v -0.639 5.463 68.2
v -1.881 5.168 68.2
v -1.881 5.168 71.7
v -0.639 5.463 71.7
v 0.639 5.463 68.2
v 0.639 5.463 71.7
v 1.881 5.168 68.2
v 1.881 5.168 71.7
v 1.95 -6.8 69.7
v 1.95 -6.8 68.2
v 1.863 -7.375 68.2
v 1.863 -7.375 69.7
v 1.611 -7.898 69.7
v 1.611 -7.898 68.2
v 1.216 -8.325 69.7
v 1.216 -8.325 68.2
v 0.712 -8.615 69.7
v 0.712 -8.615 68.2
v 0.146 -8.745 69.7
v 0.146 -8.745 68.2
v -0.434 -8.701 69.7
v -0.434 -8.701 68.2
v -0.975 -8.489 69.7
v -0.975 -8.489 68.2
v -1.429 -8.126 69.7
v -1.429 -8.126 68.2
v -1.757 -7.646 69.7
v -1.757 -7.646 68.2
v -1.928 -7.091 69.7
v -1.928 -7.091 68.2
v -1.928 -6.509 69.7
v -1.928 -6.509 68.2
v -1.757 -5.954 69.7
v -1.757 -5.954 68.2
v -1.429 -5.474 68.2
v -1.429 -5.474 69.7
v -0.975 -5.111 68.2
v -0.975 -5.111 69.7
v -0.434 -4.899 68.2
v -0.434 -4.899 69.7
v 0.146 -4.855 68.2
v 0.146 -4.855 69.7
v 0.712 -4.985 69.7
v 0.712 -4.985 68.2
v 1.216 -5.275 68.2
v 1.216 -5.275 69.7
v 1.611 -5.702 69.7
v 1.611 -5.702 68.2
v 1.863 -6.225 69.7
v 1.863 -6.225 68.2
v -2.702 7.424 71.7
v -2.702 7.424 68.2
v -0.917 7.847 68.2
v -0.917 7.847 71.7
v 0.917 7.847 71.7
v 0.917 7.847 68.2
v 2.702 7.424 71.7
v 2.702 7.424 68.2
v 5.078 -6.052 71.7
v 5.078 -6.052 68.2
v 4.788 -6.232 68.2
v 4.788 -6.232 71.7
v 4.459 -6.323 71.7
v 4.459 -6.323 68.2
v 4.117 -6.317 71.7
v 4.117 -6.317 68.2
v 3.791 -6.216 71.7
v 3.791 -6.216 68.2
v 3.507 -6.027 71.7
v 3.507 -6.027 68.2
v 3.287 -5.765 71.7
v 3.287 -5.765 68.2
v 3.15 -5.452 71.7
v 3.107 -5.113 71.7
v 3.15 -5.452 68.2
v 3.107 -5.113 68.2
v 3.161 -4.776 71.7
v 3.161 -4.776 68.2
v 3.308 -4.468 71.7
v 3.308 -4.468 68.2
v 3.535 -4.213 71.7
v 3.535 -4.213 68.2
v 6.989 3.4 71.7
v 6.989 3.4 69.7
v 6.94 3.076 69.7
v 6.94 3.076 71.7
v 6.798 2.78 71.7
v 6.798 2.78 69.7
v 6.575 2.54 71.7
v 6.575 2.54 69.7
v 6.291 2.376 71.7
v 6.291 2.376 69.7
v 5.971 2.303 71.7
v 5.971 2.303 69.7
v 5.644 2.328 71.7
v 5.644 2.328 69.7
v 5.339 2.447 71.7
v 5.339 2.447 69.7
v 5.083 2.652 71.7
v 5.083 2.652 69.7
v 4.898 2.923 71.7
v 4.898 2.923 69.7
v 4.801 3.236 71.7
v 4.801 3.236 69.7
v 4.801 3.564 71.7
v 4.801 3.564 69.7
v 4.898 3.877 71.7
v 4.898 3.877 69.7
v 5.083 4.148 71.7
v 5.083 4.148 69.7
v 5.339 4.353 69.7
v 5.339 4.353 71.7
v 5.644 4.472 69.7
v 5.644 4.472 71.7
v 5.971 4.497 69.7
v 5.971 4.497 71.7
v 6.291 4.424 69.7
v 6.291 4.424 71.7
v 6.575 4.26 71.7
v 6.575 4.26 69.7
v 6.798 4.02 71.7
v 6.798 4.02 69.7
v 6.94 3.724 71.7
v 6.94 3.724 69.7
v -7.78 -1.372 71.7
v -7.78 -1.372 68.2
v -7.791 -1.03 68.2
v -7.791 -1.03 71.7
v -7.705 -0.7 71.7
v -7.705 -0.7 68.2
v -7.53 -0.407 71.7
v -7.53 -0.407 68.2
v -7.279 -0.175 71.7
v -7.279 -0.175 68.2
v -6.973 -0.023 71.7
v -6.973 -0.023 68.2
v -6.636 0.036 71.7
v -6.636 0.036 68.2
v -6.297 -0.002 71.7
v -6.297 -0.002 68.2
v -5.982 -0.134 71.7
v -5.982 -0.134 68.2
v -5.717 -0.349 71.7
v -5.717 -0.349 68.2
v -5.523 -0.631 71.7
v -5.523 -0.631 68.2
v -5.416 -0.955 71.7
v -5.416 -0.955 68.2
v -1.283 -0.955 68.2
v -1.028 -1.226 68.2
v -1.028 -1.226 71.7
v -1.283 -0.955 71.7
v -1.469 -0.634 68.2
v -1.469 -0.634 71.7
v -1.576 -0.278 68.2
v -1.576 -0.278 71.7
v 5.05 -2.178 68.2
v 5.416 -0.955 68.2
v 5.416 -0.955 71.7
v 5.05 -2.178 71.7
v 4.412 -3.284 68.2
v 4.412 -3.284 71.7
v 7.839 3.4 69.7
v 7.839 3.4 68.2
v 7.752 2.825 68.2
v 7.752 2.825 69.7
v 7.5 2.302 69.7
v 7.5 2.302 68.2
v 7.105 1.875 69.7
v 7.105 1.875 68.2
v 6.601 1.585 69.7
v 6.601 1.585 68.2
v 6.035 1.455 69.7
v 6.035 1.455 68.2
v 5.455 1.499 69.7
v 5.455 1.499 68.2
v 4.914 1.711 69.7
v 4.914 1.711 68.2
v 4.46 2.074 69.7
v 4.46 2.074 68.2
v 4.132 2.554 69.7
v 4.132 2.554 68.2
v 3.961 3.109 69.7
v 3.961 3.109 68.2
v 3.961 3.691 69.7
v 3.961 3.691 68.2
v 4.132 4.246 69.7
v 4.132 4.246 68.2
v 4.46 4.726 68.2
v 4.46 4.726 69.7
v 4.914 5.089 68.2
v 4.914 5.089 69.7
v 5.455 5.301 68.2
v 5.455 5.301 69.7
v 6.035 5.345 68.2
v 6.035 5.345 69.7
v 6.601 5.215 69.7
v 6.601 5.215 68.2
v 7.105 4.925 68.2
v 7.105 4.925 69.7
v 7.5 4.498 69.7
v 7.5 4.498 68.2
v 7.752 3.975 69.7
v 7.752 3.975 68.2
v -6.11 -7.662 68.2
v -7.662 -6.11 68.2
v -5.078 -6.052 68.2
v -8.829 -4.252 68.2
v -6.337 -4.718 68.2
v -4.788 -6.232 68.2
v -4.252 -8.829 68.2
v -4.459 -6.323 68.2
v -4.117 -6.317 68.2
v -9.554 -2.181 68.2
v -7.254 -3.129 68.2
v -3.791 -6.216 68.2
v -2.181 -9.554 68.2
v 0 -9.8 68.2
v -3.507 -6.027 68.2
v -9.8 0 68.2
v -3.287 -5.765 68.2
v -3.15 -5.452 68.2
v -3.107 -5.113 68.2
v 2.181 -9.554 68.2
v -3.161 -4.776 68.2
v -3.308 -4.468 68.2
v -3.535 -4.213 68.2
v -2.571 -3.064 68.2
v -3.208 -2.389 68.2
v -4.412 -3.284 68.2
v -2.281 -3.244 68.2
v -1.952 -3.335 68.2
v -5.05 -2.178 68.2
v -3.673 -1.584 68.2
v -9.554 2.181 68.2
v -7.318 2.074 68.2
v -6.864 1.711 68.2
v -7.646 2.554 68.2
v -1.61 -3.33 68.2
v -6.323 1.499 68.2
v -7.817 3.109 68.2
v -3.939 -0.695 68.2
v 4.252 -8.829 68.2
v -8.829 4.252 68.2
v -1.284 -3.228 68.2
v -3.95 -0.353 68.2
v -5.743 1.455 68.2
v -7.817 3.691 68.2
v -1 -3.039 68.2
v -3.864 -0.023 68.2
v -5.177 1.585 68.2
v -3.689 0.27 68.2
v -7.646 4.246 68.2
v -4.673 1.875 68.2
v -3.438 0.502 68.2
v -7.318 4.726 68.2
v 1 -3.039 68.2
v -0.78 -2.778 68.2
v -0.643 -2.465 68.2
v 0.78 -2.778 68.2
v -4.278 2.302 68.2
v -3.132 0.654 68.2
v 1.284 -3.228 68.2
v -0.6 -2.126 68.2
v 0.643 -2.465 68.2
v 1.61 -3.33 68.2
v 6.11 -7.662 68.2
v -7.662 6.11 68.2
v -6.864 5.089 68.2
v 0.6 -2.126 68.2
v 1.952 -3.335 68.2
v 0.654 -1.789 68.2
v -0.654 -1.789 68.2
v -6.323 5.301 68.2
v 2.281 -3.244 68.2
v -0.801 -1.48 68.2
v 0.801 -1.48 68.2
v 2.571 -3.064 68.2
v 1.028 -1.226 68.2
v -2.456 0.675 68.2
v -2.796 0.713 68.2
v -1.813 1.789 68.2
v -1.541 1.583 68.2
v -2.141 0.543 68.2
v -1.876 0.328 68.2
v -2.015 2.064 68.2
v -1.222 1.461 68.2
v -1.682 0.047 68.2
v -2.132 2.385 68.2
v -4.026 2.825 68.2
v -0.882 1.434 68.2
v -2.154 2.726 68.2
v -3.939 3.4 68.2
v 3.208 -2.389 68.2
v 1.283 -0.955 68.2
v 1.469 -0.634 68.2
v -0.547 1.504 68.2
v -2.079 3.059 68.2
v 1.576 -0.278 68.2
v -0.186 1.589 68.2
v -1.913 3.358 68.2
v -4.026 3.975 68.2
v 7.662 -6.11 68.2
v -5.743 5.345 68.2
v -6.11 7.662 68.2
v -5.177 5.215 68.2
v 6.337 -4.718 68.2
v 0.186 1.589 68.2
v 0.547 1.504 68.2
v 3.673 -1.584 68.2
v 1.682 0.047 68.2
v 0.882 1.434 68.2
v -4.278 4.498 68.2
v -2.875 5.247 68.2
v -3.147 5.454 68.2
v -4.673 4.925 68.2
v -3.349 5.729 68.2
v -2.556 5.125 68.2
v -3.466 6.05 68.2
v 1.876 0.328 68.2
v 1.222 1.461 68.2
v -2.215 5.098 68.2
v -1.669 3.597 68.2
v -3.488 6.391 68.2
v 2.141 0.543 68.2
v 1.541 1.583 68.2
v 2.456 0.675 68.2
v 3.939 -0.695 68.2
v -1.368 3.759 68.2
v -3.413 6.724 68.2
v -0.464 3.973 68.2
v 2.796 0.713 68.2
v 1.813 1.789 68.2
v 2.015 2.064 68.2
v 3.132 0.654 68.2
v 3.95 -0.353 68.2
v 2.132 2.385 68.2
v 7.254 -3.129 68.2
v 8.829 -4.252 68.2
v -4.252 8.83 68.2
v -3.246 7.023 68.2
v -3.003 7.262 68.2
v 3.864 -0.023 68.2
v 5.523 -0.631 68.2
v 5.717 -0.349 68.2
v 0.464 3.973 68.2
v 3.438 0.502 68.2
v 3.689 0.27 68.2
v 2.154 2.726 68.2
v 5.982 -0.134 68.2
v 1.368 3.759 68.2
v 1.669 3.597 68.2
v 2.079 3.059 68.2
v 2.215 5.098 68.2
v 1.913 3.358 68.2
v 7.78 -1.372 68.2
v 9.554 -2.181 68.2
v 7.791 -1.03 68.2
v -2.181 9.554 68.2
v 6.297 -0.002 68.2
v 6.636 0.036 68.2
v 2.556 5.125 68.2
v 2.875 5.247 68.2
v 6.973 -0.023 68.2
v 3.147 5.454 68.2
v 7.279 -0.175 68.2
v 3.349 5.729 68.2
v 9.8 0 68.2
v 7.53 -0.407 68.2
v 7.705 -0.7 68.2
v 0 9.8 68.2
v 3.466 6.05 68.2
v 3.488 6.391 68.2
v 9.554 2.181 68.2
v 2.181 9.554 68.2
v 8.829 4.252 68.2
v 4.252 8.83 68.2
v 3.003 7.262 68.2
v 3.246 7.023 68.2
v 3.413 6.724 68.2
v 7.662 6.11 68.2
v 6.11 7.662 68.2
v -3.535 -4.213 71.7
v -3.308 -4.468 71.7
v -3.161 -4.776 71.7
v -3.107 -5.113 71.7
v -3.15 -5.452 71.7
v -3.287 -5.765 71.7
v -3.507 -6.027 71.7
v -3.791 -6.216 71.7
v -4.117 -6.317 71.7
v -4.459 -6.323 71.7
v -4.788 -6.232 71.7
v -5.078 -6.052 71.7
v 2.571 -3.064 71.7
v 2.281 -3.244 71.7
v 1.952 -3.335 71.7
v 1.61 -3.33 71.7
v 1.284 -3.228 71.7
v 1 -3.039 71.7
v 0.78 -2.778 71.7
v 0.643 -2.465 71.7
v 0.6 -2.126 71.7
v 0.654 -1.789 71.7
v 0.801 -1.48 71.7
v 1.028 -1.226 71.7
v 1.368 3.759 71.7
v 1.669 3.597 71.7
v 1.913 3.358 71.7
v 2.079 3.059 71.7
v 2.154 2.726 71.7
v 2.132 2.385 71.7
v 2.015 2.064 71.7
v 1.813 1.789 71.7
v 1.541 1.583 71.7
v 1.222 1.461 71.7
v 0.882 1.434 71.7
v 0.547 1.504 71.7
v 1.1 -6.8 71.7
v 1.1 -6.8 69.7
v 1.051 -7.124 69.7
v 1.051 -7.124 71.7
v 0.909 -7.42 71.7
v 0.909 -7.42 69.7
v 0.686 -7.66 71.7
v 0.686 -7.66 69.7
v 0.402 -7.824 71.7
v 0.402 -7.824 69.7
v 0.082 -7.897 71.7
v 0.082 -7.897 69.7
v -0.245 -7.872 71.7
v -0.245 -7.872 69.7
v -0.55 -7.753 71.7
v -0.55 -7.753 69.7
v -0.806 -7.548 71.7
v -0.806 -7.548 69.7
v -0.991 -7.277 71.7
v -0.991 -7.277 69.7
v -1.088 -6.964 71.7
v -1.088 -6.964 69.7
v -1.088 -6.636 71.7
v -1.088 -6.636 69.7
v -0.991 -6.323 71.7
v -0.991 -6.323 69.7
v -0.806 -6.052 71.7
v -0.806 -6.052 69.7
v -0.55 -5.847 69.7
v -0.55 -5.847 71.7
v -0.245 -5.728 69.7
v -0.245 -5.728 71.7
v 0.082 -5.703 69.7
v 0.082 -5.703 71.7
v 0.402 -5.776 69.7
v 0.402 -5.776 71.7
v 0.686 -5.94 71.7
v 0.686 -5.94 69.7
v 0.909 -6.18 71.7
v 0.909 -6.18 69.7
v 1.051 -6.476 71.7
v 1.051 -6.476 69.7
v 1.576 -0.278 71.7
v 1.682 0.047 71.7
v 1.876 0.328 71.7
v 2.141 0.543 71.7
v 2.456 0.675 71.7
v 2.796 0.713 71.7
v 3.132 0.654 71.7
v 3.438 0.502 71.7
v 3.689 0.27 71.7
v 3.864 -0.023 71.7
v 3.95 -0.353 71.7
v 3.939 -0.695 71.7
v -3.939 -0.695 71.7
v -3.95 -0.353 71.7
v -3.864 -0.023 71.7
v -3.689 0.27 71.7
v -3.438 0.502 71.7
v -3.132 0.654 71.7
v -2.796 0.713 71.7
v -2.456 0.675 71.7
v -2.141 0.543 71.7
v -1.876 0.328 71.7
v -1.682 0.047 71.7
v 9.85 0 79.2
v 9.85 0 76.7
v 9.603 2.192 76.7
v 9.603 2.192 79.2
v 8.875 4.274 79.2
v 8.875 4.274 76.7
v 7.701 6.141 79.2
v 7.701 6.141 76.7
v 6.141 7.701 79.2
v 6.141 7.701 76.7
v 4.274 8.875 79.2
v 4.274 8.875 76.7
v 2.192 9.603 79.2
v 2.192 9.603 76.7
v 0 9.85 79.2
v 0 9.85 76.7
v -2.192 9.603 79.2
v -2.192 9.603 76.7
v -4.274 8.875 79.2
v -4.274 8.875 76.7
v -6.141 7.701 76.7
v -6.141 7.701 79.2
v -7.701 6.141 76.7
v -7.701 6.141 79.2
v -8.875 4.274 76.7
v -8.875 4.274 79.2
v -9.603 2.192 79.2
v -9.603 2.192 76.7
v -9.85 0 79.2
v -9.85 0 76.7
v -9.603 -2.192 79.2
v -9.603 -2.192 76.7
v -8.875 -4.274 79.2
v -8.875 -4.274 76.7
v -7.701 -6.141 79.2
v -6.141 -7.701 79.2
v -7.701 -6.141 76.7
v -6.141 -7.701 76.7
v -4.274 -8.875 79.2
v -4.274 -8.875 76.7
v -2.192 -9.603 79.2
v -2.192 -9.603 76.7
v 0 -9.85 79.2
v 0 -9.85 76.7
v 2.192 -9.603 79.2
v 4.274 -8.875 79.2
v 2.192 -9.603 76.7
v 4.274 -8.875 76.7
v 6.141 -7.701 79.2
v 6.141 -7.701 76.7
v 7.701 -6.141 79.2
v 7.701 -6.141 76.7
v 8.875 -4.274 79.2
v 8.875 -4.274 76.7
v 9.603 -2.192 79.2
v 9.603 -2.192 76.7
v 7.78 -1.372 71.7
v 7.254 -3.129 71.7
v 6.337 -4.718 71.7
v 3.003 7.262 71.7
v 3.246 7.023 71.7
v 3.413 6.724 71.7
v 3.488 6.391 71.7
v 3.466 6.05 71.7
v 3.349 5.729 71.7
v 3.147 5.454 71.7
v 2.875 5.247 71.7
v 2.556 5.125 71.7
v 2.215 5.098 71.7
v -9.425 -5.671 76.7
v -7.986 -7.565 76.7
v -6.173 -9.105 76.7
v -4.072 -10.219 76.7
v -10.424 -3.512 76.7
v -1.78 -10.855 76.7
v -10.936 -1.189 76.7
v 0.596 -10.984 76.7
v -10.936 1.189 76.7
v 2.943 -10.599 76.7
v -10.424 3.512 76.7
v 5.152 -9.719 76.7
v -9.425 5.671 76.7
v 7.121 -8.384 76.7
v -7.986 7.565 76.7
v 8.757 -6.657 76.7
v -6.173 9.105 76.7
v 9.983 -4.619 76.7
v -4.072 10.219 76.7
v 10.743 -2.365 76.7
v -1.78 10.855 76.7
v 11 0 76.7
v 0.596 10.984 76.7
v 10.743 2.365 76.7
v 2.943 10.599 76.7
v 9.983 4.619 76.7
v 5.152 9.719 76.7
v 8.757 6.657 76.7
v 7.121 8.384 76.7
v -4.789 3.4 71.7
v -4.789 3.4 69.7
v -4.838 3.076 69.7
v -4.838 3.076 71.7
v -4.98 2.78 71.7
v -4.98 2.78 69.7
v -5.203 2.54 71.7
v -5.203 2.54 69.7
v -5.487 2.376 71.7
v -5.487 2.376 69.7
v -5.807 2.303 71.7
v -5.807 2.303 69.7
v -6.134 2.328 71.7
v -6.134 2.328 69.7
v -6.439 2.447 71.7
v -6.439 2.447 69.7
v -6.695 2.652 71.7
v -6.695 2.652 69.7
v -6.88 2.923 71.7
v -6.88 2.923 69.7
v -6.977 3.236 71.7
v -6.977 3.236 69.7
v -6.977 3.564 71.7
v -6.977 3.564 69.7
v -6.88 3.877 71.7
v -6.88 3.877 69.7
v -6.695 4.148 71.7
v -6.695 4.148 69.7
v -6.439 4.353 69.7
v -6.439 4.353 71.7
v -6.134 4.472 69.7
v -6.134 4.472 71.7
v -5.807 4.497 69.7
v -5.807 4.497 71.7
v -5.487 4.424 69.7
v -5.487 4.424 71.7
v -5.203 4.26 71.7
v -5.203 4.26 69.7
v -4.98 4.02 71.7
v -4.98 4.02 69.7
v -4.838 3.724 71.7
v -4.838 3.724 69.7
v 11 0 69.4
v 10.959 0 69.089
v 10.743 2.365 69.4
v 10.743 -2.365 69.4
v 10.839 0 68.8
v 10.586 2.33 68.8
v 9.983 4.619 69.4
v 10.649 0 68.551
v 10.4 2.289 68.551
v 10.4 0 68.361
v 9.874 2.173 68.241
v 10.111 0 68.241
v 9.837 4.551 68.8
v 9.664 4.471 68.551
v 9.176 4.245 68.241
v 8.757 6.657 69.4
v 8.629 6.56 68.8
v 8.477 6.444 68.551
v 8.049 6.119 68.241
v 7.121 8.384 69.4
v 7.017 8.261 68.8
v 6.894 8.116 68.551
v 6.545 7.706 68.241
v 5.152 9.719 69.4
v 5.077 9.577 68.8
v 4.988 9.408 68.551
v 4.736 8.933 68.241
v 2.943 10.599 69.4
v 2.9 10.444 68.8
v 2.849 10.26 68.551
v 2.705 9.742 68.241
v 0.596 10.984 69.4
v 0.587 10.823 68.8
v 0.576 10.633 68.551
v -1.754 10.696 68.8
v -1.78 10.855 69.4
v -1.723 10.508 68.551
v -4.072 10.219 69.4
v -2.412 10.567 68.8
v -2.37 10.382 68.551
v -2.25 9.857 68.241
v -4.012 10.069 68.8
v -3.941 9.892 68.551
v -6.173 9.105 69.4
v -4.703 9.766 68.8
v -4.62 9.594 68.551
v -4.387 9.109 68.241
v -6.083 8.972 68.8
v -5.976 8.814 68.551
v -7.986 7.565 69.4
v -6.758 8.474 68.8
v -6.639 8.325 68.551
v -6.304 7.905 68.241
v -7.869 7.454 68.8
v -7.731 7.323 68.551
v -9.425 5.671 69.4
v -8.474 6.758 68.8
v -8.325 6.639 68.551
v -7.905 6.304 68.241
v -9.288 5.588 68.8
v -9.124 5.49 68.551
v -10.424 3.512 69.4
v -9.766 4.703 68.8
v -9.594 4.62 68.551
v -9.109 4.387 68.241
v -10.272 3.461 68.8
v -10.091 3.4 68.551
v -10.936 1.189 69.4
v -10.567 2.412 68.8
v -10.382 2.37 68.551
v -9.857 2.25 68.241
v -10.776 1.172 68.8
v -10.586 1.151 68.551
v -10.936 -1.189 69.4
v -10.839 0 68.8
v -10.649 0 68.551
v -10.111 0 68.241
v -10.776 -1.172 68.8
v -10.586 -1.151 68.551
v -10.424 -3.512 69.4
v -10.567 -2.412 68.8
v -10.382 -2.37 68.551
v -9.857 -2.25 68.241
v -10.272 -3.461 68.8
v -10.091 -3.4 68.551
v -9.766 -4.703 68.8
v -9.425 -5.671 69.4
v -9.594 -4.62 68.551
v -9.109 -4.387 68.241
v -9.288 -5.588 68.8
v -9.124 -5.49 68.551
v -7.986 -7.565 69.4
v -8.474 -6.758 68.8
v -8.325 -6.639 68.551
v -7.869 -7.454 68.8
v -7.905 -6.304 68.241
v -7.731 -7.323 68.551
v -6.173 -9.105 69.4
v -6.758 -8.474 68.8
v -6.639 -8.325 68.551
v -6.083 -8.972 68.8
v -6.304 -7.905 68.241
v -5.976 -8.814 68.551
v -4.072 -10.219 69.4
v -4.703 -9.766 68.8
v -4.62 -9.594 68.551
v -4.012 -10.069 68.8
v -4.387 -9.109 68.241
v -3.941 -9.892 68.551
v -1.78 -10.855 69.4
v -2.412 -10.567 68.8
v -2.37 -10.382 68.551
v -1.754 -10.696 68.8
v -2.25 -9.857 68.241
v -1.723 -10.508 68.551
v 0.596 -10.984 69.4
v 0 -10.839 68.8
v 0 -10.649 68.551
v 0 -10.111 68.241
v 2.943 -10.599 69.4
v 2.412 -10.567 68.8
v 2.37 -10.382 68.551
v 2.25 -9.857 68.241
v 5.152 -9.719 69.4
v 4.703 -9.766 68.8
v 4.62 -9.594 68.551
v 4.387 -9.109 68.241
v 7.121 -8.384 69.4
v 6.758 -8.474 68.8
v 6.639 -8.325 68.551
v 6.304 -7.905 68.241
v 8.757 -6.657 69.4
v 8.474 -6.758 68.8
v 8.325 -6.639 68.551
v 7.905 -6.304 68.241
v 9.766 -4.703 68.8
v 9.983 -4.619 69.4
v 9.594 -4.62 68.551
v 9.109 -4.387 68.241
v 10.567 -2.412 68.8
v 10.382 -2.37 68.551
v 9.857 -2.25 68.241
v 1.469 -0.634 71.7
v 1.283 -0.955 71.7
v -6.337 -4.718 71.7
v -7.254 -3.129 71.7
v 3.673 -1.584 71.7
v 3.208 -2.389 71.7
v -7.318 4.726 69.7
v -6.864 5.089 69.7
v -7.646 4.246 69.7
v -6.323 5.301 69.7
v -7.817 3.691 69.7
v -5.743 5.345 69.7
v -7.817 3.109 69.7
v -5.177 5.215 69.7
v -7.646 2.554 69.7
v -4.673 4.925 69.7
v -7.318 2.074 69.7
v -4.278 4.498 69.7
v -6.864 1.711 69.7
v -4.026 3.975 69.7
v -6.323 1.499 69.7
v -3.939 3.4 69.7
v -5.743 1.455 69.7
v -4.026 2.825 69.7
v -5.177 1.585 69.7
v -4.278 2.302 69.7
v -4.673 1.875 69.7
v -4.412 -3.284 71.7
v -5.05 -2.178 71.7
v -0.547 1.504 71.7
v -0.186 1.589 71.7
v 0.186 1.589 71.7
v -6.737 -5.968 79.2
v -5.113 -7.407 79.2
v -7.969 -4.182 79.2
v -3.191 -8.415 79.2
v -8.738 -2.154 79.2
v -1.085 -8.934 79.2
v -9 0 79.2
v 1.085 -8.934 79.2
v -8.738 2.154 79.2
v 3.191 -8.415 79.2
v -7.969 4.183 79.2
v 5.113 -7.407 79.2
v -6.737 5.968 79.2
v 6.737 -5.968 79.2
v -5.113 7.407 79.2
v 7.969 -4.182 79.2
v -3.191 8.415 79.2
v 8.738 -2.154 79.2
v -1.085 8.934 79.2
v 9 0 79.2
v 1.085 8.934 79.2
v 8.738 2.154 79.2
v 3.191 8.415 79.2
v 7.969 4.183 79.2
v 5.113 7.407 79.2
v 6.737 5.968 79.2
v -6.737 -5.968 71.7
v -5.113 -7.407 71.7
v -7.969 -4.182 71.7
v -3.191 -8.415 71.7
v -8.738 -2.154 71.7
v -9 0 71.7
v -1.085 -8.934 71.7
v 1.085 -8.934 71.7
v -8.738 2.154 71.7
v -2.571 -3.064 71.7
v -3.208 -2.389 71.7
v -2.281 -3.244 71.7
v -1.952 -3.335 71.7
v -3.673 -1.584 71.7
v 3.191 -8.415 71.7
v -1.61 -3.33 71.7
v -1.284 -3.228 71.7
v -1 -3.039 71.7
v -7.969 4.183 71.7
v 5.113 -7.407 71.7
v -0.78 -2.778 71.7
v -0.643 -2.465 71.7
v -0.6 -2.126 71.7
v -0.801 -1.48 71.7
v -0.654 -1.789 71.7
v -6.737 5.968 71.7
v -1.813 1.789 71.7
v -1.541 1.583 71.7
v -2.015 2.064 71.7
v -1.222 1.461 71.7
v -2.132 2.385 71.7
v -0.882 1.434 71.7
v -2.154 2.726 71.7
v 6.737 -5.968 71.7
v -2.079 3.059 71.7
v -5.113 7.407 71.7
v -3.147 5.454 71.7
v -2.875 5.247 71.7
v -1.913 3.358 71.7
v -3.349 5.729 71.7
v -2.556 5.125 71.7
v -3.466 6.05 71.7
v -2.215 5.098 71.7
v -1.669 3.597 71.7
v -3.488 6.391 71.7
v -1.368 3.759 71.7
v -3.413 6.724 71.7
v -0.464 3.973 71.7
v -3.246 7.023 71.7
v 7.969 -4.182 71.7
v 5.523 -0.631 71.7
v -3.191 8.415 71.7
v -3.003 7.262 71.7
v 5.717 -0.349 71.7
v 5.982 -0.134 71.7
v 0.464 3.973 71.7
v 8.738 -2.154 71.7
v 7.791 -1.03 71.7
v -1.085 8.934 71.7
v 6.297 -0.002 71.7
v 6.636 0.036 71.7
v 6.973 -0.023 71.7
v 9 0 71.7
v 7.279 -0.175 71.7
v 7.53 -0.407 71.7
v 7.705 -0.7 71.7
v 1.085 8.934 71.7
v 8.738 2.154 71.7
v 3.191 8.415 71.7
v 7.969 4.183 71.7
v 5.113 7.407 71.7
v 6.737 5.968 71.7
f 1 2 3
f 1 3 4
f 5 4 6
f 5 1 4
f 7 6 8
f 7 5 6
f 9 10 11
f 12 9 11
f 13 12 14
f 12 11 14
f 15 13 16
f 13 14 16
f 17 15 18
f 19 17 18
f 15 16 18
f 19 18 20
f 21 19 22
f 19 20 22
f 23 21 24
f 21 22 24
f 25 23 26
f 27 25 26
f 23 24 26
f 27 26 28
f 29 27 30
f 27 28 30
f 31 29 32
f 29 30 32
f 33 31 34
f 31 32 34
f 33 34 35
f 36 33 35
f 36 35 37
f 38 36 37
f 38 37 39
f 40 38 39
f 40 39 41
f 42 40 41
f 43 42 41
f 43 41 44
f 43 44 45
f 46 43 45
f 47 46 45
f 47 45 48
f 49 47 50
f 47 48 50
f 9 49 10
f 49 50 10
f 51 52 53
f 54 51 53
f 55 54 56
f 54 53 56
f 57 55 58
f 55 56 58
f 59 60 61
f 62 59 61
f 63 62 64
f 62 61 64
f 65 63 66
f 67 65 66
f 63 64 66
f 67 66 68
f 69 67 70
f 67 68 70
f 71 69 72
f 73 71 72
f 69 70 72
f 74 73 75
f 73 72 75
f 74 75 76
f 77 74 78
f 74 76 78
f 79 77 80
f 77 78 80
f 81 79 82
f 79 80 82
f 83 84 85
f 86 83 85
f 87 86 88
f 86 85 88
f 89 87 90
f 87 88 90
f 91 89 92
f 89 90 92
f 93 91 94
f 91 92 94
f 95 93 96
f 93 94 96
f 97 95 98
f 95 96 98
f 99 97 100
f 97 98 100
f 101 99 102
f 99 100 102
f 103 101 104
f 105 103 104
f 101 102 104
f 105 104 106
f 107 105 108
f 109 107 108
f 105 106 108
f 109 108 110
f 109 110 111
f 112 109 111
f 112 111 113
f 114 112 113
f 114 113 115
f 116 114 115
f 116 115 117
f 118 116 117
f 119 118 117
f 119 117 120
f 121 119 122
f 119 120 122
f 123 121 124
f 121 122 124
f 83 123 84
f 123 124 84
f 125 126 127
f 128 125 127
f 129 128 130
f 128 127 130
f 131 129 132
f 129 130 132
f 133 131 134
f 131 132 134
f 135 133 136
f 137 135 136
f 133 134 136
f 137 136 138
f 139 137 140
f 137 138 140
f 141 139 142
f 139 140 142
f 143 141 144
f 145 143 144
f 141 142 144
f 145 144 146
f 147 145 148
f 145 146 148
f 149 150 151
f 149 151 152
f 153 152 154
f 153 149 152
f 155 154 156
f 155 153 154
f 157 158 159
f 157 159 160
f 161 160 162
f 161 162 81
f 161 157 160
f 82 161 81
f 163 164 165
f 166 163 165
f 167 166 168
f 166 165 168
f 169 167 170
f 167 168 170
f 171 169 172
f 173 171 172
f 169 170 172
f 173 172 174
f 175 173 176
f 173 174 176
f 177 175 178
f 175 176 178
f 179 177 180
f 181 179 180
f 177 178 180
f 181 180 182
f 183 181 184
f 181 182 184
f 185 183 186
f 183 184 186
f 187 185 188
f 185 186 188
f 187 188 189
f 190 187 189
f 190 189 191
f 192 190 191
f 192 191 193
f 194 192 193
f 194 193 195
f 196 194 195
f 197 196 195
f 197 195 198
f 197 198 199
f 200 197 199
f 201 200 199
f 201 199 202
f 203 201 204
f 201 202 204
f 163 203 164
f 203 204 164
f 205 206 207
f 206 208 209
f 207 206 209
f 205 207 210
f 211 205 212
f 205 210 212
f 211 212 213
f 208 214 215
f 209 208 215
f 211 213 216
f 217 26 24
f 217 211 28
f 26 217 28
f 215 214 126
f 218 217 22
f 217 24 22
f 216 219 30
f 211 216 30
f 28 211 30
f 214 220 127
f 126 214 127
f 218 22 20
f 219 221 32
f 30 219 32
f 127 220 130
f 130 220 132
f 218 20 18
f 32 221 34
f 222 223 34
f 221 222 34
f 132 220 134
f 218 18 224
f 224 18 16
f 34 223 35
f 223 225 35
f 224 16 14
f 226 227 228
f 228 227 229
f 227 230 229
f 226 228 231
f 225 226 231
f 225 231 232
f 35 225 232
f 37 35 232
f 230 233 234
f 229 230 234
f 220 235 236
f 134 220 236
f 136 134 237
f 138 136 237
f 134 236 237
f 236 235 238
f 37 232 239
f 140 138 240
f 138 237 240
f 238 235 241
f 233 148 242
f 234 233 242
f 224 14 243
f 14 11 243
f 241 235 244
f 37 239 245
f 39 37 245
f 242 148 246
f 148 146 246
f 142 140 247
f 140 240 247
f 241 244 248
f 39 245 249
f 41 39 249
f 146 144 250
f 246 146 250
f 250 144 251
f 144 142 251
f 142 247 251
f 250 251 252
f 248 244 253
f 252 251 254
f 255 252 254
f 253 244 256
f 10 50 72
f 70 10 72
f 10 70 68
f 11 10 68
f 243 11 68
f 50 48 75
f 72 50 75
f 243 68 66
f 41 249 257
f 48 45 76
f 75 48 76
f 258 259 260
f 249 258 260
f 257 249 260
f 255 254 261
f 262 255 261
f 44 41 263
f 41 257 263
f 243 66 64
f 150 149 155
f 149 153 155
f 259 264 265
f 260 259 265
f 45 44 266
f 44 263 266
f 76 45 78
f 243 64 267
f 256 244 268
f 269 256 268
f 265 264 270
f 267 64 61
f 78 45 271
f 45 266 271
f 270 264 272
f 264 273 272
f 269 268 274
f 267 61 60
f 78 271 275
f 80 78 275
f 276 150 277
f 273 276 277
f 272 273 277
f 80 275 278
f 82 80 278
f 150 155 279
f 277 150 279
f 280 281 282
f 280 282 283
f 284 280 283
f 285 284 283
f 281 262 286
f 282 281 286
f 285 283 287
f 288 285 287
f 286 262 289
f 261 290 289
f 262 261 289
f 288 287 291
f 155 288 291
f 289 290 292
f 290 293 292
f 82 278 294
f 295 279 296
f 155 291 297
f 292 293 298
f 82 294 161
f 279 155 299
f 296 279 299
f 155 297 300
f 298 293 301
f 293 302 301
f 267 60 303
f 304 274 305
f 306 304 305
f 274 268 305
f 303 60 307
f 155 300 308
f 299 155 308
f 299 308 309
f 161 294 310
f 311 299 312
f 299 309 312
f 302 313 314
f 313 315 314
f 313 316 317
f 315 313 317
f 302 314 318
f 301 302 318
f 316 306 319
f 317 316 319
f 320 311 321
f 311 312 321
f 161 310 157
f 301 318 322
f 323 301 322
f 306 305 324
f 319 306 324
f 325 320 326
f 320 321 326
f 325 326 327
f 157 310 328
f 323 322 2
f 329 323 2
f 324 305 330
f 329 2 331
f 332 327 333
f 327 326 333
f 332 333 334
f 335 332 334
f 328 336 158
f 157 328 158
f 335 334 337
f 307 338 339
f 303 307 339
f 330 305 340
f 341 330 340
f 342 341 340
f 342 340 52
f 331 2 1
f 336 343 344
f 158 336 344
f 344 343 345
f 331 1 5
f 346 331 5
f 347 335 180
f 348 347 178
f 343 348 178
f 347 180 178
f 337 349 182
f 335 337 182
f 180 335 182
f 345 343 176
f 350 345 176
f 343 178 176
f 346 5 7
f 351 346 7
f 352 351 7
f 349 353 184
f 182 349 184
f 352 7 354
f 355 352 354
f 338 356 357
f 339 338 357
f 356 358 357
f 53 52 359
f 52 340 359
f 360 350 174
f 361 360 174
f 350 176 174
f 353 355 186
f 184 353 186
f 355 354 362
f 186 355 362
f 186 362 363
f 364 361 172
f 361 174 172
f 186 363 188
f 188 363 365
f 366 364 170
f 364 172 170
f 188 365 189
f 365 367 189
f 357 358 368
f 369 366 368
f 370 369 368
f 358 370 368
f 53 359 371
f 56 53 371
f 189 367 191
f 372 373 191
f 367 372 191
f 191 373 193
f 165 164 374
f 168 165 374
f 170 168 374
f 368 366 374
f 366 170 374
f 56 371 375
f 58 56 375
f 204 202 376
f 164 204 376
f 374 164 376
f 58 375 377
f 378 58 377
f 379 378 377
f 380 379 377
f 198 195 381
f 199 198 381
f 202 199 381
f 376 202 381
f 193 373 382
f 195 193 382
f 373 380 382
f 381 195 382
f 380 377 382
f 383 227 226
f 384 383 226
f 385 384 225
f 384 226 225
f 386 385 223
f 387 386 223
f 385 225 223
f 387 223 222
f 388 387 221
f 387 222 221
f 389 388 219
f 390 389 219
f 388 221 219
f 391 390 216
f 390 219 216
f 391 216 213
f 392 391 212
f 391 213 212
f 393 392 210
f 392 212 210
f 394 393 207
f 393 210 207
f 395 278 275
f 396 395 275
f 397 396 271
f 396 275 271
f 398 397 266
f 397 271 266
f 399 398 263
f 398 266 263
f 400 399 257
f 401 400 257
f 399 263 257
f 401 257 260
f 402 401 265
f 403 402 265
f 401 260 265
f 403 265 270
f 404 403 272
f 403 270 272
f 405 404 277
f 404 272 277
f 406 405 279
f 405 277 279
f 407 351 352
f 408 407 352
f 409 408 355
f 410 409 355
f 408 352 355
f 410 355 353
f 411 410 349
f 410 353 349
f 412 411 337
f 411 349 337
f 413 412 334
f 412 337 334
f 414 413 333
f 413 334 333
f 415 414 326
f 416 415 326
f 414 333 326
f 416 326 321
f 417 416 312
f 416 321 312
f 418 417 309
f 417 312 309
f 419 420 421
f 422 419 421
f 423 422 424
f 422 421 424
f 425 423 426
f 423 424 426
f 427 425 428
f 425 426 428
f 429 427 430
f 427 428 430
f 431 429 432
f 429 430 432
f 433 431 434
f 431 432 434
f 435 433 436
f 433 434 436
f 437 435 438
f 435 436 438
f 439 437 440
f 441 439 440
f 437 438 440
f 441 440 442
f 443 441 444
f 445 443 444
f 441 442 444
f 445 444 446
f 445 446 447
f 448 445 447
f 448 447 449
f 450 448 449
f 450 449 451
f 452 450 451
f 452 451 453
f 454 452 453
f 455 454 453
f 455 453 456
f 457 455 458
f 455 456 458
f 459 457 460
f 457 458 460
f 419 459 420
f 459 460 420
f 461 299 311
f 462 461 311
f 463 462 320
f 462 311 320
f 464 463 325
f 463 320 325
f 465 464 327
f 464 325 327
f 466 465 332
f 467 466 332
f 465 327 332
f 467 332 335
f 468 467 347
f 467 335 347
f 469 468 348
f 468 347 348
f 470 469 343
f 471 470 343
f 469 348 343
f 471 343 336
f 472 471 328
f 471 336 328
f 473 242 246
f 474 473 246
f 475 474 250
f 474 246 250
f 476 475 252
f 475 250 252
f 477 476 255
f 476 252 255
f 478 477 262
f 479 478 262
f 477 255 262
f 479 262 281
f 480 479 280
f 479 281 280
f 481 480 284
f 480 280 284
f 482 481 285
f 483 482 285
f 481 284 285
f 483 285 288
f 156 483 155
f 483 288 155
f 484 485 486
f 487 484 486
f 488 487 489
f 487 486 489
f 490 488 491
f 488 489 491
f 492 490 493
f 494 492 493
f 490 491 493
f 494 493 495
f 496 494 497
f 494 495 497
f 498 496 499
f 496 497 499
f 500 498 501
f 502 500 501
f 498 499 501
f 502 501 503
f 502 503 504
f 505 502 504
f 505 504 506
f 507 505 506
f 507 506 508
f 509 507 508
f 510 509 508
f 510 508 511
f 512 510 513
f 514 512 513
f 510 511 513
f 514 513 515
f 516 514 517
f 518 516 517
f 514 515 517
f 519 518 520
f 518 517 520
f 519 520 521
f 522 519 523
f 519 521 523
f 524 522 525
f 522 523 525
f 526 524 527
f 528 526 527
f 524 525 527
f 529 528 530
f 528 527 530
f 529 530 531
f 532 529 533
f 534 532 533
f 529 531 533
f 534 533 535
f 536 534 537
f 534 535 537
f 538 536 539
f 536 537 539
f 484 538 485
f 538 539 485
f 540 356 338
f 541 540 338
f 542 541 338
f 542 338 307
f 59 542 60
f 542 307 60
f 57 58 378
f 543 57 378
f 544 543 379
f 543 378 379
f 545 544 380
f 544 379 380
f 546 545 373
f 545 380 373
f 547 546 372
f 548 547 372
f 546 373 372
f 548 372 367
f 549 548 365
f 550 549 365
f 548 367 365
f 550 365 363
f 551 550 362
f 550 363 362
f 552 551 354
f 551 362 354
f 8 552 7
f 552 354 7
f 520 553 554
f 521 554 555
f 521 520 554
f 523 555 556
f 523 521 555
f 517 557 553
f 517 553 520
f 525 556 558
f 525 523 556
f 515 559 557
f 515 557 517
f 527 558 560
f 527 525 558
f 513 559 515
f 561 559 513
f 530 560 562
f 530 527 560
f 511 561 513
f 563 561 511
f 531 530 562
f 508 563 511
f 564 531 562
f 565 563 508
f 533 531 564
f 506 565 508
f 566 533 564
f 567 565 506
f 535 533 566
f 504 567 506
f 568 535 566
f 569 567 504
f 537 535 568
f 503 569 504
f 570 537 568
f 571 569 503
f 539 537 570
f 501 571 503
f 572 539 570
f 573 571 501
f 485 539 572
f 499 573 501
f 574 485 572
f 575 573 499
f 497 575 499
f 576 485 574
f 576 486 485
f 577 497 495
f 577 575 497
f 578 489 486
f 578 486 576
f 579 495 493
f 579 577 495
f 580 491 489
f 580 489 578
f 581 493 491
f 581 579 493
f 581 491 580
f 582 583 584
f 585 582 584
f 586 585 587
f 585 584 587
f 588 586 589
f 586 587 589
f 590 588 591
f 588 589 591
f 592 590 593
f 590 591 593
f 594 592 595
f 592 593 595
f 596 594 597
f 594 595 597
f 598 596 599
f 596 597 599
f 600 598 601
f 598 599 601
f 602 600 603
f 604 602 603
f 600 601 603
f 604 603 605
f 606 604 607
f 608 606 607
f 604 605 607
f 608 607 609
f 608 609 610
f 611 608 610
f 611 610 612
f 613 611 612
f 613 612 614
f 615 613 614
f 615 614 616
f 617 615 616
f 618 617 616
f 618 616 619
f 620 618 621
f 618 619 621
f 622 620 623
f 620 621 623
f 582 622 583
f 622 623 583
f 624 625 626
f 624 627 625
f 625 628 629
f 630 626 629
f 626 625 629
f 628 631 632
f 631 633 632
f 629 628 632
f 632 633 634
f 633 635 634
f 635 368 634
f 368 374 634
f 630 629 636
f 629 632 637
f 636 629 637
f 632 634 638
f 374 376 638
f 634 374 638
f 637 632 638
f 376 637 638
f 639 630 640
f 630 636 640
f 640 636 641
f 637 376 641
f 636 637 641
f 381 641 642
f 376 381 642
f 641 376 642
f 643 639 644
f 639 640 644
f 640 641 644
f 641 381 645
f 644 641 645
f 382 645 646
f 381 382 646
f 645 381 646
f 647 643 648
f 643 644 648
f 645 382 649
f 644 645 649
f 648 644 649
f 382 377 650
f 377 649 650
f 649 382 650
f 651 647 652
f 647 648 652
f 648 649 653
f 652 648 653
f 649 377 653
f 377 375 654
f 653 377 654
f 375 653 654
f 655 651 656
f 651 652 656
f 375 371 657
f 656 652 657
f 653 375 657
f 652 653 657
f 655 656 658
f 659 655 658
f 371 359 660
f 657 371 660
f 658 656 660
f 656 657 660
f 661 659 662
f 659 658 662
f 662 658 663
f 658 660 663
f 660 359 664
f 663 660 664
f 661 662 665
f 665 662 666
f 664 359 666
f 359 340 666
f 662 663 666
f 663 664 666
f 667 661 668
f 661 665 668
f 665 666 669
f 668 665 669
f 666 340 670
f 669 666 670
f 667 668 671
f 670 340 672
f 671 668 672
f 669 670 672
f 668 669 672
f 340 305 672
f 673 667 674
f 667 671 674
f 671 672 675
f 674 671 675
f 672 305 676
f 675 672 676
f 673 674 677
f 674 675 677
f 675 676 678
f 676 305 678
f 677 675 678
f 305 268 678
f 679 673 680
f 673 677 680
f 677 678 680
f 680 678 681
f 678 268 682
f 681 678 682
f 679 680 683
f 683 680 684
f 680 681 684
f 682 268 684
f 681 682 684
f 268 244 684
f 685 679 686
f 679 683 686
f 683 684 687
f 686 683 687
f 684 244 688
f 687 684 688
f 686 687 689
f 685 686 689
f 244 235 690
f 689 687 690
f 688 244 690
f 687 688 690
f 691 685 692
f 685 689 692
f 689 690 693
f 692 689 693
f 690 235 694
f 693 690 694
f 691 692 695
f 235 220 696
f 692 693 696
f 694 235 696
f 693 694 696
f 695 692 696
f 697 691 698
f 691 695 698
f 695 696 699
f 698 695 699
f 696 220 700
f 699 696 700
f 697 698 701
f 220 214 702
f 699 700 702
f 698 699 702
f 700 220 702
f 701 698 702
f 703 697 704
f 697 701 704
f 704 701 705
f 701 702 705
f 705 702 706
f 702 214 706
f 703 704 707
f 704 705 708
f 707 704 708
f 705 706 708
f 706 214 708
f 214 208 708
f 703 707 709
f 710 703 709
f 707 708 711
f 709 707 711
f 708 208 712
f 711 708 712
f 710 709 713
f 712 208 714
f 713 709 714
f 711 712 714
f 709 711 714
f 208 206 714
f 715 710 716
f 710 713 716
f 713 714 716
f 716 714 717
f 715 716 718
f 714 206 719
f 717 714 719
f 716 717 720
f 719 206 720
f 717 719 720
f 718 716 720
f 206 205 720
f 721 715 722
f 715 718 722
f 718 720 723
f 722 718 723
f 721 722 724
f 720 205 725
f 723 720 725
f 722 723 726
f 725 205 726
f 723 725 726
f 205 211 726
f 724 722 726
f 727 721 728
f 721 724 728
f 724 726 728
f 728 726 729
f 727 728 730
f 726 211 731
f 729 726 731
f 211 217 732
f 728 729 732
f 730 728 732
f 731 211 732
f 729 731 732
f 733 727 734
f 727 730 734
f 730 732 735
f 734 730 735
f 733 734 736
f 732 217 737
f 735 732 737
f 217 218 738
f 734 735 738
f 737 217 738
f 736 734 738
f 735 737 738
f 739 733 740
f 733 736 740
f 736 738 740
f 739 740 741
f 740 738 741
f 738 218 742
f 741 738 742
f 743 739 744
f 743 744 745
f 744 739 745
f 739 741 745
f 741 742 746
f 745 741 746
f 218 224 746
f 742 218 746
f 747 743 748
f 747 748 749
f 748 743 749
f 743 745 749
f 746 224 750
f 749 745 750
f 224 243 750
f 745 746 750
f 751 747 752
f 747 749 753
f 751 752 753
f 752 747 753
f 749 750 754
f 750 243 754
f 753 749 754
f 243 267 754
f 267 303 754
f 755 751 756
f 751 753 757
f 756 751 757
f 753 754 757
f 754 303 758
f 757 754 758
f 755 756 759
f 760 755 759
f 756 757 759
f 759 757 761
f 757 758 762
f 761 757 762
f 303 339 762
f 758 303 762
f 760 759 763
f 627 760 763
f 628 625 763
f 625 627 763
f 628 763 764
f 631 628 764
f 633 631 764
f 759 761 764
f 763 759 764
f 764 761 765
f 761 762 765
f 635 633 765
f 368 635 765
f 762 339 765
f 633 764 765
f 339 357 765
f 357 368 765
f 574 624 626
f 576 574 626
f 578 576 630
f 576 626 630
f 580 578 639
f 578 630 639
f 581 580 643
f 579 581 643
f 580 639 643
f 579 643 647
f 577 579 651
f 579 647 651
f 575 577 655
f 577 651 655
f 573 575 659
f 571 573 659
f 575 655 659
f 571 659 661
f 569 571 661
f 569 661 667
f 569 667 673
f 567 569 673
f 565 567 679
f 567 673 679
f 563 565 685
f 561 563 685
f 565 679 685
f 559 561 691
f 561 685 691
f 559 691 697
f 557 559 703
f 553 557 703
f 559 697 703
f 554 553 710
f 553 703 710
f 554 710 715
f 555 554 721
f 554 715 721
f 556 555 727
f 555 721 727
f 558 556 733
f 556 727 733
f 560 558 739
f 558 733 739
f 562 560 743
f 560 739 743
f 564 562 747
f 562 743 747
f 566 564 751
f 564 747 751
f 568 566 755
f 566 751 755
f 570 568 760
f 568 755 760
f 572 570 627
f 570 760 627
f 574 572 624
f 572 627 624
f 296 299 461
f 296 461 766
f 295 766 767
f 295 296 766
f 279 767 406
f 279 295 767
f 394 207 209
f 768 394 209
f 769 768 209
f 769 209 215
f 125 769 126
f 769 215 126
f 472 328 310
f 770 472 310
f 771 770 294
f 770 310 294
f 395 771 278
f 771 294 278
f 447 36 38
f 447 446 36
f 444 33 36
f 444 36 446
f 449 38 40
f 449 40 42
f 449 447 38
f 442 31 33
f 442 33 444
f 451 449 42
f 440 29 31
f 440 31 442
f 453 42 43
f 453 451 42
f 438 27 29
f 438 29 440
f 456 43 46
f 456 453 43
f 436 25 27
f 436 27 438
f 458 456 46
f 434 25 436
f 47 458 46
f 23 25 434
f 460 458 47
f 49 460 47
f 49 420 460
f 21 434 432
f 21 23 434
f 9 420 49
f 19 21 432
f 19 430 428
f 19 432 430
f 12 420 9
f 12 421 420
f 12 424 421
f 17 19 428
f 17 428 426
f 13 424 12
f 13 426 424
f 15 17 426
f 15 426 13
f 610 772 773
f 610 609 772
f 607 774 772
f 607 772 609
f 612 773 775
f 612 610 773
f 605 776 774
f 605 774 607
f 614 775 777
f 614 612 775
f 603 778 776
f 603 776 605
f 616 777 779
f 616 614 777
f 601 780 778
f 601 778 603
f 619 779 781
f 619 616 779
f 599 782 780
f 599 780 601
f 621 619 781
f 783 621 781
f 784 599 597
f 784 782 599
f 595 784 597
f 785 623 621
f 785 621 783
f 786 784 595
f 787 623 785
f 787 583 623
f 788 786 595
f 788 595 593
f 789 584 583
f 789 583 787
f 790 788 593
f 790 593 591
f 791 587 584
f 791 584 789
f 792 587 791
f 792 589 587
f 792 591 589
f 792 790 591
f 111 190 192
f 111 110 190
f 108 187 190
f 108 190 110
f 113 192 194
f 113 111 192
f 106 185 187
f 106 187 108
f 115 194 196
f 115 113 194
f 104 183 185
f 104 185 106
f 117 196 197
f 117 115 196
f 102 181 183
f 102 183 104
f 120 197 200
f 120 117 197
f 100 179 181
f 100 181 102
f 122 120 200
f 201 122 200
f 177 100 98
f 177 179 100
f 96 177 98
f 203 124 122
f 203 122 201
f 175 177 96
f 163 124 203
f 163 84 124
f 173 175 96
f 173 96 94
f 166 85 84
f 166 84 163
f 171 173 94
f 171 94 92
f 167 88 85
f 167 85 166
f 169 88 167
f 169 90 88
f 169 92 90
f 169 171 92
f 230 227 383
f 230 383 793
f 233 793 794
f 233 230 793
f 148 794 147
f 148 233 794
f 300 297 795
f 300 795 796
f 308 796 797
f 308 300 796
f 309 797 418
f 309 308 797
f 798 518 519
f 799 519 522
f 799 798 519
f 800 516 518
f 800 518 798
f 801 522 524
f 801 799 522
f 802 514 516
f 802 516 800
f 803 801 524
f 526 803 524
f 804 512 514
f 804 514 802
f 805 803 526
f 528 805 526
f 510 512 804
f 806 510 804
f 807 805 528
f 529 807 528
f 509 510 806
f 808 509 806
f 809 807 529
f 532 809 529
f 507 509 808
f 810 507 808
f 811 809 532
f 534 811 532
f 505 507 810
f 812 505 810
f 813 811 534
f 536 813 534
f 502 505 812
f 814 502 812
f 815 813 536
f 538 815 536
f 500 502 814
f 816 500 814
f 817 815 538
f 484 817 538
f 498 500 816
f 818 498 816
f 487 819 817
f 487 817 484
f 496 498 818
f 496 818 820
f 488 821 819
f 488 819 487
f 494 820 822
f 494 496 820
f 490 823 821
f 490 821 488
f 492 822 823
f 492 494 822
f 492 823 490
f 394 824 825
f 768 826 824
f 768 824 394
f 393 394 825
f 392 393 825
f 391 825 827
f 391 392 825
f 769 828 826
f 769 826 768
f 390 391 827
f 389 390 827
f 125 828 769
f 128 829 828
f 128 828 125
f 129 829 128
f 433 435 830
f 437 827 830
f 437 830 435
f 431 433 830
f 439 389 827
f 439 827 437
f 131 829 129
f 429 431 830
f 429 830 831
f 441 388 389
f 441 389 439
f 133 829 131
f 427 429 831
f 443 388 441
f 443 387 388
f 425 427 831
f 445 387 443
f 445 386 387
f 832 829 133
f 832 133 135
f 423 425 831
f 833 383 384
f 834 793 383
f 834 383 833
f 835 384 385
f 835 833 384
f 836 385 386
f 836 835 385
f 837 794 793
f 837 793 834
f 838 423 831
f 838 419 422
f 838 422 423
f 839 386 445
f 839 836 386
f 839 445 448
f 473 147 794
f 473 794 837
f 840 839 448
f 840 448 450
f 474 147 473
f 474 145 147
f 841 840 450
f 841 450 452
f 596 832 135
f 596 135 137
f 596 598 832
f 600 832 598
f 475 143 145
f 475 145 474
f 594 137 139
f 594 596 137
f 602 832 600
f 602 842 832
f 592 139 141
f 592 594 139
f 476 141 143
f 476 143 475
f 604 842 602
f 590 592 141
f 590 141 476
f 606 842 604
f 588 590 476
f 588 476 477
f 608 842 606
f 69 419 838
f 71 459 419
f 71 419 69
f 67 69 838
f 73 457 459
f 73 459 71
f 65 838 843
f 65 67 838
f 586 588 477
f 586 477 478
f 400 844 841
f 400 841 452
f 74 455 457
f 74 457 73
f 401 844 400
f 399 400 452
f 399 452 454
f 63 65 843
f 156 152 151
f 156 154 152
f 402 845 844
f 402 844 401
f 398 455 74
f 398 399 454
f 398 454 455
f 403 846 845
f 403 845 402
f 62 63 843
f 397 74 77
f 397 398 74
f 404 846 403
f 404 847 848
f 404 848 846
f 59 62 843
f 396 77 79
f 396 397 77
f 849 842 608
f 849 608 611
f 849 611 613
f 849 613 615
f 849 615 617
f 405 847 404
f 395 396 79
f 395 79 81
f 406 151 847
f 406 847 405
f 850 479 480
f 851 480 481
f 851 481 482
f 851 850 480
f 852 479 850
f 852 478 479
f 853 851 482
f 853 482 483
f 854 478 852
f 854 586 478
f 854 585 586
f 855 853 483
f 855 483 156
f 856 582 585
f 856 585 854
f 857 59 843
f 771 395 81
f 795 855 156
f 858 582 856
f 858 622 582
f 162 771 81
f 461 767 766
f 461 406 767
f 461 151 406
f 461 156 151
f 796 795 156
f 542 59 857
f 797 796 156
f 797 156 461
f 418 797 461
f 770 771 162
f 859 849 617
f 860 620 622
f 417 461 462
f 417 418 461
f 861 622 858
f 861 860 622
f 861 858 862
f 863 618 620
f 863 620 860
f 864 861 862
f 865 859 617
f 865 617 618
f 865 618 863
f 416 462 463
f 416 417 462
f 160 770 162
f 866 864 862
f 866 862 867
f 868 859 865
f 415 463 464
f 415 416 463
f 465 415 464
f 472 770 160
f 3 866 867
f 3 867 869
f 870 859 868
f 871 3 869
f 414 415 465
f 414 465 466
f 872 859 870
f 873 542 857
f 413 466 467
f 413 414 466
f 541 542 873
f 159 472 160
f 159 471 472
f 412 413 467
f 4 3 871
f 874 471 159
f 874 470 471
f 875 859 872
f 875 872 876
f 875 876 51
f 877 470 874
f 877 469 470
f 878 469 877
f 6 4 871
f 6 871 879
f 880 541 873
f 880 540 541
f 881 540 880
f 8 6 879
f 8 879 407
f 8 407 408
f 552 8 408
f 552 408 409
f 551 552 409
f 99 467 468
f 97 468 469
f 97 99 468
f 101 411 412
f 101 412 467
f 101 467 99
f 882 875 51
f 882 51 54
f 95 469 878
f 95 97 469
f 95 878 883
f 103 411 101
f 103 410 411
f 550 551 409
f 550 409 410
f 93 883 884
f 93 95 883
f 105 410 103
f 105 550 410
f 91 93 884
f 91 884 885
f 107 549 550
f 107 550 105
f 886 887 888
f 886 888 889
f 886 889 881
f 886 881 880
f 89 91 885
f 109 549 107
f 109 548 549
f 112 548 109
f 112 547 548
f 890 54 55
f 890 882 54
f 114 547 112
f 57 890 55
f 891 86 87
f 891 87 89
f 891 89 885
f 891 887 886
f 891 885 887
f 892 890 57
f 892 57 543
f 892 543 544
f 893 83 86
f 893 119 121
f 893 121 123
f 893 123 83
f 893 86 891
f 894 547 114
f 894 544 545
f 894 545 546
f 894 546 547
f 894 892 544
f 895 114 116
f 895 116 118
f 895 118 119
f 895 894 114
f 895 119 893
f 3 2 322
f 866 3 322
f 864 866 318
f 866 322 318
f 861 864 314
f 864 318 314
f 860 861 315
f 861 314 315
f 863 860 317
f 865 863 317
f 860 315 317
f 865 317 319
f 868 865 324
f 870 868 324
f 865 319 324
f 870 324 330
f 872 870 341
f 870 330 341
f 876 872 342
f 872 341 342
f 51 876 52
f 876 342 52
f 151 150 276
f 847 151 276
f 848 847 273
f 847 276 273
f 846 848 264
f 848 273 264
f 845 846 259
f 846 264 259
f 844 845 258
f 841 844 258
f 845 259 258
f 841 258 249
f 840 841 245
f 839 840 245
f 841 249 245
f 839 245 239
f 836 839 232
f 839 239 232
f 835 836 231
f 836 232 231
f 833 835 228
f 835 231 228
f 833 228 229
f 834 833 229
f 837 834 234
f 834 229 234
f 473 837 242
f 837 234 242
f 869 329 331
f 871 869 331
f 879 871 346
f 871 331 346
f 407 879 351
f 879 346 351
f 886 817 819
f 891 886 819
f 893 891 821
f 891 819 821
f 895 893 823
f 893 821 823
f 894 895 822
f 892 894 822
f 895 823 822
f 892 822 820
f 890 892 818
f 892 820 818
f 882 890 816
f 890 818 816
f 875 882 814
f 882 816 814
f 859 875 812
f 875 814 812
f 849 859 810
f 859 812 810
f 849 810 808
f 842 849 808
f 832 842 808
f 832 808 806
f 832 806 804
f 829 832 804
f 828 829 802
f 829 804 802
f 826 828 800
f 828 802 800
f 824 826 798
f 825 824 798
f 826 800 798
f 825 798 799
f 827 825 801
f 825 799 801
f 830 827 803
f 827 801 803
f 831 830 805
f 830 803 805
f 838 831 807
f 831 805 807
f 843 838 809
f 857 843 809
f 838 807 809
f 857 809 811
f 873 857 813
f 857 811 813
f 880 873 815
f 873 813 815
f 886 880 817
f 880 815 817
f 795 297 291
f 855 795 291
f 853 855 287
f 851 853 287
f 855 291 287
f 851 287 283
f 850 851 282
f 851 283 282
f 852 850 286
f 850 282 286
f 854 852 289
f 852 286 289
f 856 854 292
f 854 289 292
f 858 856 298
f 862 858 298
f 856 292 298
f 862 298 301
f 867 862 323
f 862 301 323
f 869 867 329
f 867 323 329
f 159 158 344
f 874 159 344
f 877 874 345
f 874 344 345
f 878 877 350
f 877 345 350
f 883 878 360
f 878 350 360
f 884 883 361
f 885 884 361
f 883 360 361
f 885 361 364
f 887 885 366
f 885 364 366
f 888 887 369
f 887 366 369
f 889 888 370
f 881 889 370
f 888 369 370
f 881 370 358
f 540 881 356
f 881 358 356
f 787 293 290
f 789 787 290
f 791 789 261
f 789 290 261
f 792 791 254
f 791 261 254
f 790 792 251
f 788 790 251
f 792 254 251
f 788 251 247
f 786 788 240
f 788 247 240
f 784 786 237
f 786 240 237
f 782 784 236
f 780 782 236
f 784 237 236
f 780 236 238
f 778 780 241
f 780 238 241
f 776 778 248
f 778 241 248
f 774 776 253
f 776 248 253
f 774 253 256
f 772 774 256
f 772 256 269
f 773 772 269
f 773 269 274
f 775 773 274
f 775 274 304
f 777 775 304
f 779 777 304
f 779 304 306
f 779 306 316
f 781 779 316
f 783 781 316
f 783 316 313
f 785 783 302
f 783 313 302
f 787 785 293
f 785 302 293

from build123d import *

# Parameters (mm, degrees)
SKETCH_R        = 11
PAD_DEPTH       = 8.5
SKETCH001_R     = 9.85
PAD001_DEPTH    = 2.5
SKETCH002_R     = 9
POCKET_DEPTH    = 7.5
SKETCH003_R     = 1.95
POCKET001_DEPTH = 1.5
FILLET_R        = 1.2
SKETCH005_R     = 1.1
POCKET002_DEPTH = 2
POCKET003_DEPTH = 3.5


with BuildPart() as part:
    # Sketch → Pad (new body)
    with BuildSketch(Plane.XY):
        Circle(SKETCH_R)
    extrude(amount=PAD_DEPTH)

    # Sketch001 (on Face3 of Pad) → Pad001 (join)
    with BuildSketch(Plane.XY.offset(8.5)):
        Circle(SKETCH001_R)
    extrude(amount=PAD001_DEPTH)

    # Sketch002 (on Face5 of Pad001) → Pocket (cut)
    with BuildSketch(Plane.XY.offset(11)):
        Circle(SKETCH002_R)
    extrude(amount=-POCKET_DEPTH, mode=Mode.SUBTRACT)

    # Sketch003 (on Face2 of Pocket) → Pocket001 (cut)
    with BuildSketch(Plane(origin=(0, 0, 0), x_dir=(1, 0, 0), z_dir=(0, 0, -1))):
        with Locations((0, 6.8)):
            Circle(SKETCH003_R)
        with Locations((-5.8889727457, -3.4)):
            Circle(SKETCH003_R)
        with Locations((5.8889727457, -3.4)):
            Circle(SKETCH003_R)
    extrude(amount=-POCKET001_DEPTH, mode=Mode.SUBTRACT)

    # Fillet
    fillet_edges = [part.edges().sort_by_distance(p)[0] for p in [
        (-11, 0, 0),
    ]]
    fillet(fillet_edges, radius=FILLET_R)

    # Sketch005 (on Face11 of Fillet) → Pocket002 (cut)
    with BuildSketch(Plane(origin=(0, 0, 1.5), x_dir=(1, 0, 0), z_dir=(0, 0, -1))):
        with Locations((-5.8889727457, -3.4)):
            Circle(SKETCH005_R)
        with Locations((0, 6.8)):
            Circle(SKETCH005_R)
        with Locations((5.8889727457, -3.4)):
            Circle(SKETCH005_R)
    extrude(amount=-POCKET002_DEPTH, mode=Mode.SUBTRACT)

    # Sketch007 (on Face4 of Pocket002) → Pocket003 (cut)
    with BuildSketch(Plane(origin=(0, 0, 0), x_dir=(1, 0, 0), z_dir=(0, 0, -1))):
        with BuildLine():
            ThreePointArc((-3.5353318533, 4.2132444372), (-3.3874236532, 5.9038429005), (-5.0780221165, 6.0517511006))
            ThreePointArc((-5.0780221165, 6.0517511006), (-6.8416006899, 3.95), (-7.7799812488, 1.3718206036))
            ThreePointArc((-7.7799812488, 1.3718206036), (-6.8065897584, -0.0183265132), (-5.4164426416, 0.9550649772))
            ThreePointArc((-3.5353318533, 4.2132444372), (-4.7631397208, 2.75), (-5.4164426416, 0.9550649772))
        make_face()
        with BuildLine():
            ThreePointArc((5.0780221165, 6.0517511006), (3.3874236532, 5.9038429005), (3.5353318533, 4.2132444372))
            ThreePointArc((5.4164426416, 0.9550649772), (4.7631397208, 2.75), (3.5353318533, 4.2132444372))
            ThreePointArc((5.4164426416, 0.9550649772), (6.8065897584, -0.0183265132), (7.7799812488, 1.3718206036))
            ThreePointArc((7.7799812488, 1.3718206036), (6.8416006899, 3.95), (5.0780221165, 6.0517511006))
        make_face()
        with BuildLine():
            ThreePointArc((-1.8811107883, -5.1683094143), (-3.4191661052, -5.8855163873), (-2.7019591323, -7.4235717042))
            ThreePointArc((-2.7019591323, -7.4235717042), (0, -7.9), (2.7019591323, -7.4235717042))
            ThreePointArc((2.7019591323, -7.4235717042), (3.4191661052, -5.8855163873), (1.8811107883, -5.1683094143))
            ThreePointArc((-1.8811107883, -5.1683094143), (0, -5.5), (1.8811107883, -5.1683094143))
        make_face()
        with BuildLine():
            ThreePointArc((-1.0284601755, 1.225671109), (-0.8805519754, 2.9162695724), (-2.5711504387, 3.0641777725))
            ThreePointArc((-2.5711504387, 3.0641777725), (-3.4641016151, 2), (-3.939231012, 0.6945927107))
            ThreePointArc((-3.939231012, 0.6945927107), (-2.9658395216, -0.6955544061), (-1.5756924048, 0.2778370843))
            ThreePointArc((-1.0284601755, 1.225671109), (-1.3856406461, 0.8), (-1.5756924048, 0.2778370843))
        make_face()
        with BuildLine():
            ThreePointArc((-0.5472322293, -1.5035081933), (0, -1.6), (0.5472322293, -1.5035081933))
            ThreePointArc((1.3680805733, -3.7587704831), (2.0852875463, -2.2207151662), (0.5472322293, -1.5035081933))
            ThreePointArc((-1.3680805733, -3.7587704831), (0, -4), (1.3680805733, -3.7587704831))
            ThreePointArc((-0.5472322293, -1.5035081933), (-2.0852875463, -2.2207151662), (-1.3680805733, -3.7587704831))
        make_face()
        with BuildLine():
            ThreePointArc((2.5711504387, 3.0641777725), (0.8805519754, 2.9162695724), (1.0284601755, 1.225671109))
            ThreePointArc((1.5756924048, 0.2778370843), (1.3856406461, 0.8), (1.0284601755, 1.225671109))
            ThreePointArc((1.5756924048, 0.2778370843), (2.9658395216, -0.6955544061), (3.939231012, 0.6945927107))
            ThreePointArc((3.939231012, 0.6945927107), (3.4641016151, 2), (2.5711504387, 3.0641777725))
        make_face()
    extrude(amount=-POCKET003_DEPTH, mode=Mode.SUBTRACT)


with BuildPart() as part_1:
    # Body placement: moved
    add(part.part.moved(Location((0, 1e-05, 68.2))))


solid = part_1.part
